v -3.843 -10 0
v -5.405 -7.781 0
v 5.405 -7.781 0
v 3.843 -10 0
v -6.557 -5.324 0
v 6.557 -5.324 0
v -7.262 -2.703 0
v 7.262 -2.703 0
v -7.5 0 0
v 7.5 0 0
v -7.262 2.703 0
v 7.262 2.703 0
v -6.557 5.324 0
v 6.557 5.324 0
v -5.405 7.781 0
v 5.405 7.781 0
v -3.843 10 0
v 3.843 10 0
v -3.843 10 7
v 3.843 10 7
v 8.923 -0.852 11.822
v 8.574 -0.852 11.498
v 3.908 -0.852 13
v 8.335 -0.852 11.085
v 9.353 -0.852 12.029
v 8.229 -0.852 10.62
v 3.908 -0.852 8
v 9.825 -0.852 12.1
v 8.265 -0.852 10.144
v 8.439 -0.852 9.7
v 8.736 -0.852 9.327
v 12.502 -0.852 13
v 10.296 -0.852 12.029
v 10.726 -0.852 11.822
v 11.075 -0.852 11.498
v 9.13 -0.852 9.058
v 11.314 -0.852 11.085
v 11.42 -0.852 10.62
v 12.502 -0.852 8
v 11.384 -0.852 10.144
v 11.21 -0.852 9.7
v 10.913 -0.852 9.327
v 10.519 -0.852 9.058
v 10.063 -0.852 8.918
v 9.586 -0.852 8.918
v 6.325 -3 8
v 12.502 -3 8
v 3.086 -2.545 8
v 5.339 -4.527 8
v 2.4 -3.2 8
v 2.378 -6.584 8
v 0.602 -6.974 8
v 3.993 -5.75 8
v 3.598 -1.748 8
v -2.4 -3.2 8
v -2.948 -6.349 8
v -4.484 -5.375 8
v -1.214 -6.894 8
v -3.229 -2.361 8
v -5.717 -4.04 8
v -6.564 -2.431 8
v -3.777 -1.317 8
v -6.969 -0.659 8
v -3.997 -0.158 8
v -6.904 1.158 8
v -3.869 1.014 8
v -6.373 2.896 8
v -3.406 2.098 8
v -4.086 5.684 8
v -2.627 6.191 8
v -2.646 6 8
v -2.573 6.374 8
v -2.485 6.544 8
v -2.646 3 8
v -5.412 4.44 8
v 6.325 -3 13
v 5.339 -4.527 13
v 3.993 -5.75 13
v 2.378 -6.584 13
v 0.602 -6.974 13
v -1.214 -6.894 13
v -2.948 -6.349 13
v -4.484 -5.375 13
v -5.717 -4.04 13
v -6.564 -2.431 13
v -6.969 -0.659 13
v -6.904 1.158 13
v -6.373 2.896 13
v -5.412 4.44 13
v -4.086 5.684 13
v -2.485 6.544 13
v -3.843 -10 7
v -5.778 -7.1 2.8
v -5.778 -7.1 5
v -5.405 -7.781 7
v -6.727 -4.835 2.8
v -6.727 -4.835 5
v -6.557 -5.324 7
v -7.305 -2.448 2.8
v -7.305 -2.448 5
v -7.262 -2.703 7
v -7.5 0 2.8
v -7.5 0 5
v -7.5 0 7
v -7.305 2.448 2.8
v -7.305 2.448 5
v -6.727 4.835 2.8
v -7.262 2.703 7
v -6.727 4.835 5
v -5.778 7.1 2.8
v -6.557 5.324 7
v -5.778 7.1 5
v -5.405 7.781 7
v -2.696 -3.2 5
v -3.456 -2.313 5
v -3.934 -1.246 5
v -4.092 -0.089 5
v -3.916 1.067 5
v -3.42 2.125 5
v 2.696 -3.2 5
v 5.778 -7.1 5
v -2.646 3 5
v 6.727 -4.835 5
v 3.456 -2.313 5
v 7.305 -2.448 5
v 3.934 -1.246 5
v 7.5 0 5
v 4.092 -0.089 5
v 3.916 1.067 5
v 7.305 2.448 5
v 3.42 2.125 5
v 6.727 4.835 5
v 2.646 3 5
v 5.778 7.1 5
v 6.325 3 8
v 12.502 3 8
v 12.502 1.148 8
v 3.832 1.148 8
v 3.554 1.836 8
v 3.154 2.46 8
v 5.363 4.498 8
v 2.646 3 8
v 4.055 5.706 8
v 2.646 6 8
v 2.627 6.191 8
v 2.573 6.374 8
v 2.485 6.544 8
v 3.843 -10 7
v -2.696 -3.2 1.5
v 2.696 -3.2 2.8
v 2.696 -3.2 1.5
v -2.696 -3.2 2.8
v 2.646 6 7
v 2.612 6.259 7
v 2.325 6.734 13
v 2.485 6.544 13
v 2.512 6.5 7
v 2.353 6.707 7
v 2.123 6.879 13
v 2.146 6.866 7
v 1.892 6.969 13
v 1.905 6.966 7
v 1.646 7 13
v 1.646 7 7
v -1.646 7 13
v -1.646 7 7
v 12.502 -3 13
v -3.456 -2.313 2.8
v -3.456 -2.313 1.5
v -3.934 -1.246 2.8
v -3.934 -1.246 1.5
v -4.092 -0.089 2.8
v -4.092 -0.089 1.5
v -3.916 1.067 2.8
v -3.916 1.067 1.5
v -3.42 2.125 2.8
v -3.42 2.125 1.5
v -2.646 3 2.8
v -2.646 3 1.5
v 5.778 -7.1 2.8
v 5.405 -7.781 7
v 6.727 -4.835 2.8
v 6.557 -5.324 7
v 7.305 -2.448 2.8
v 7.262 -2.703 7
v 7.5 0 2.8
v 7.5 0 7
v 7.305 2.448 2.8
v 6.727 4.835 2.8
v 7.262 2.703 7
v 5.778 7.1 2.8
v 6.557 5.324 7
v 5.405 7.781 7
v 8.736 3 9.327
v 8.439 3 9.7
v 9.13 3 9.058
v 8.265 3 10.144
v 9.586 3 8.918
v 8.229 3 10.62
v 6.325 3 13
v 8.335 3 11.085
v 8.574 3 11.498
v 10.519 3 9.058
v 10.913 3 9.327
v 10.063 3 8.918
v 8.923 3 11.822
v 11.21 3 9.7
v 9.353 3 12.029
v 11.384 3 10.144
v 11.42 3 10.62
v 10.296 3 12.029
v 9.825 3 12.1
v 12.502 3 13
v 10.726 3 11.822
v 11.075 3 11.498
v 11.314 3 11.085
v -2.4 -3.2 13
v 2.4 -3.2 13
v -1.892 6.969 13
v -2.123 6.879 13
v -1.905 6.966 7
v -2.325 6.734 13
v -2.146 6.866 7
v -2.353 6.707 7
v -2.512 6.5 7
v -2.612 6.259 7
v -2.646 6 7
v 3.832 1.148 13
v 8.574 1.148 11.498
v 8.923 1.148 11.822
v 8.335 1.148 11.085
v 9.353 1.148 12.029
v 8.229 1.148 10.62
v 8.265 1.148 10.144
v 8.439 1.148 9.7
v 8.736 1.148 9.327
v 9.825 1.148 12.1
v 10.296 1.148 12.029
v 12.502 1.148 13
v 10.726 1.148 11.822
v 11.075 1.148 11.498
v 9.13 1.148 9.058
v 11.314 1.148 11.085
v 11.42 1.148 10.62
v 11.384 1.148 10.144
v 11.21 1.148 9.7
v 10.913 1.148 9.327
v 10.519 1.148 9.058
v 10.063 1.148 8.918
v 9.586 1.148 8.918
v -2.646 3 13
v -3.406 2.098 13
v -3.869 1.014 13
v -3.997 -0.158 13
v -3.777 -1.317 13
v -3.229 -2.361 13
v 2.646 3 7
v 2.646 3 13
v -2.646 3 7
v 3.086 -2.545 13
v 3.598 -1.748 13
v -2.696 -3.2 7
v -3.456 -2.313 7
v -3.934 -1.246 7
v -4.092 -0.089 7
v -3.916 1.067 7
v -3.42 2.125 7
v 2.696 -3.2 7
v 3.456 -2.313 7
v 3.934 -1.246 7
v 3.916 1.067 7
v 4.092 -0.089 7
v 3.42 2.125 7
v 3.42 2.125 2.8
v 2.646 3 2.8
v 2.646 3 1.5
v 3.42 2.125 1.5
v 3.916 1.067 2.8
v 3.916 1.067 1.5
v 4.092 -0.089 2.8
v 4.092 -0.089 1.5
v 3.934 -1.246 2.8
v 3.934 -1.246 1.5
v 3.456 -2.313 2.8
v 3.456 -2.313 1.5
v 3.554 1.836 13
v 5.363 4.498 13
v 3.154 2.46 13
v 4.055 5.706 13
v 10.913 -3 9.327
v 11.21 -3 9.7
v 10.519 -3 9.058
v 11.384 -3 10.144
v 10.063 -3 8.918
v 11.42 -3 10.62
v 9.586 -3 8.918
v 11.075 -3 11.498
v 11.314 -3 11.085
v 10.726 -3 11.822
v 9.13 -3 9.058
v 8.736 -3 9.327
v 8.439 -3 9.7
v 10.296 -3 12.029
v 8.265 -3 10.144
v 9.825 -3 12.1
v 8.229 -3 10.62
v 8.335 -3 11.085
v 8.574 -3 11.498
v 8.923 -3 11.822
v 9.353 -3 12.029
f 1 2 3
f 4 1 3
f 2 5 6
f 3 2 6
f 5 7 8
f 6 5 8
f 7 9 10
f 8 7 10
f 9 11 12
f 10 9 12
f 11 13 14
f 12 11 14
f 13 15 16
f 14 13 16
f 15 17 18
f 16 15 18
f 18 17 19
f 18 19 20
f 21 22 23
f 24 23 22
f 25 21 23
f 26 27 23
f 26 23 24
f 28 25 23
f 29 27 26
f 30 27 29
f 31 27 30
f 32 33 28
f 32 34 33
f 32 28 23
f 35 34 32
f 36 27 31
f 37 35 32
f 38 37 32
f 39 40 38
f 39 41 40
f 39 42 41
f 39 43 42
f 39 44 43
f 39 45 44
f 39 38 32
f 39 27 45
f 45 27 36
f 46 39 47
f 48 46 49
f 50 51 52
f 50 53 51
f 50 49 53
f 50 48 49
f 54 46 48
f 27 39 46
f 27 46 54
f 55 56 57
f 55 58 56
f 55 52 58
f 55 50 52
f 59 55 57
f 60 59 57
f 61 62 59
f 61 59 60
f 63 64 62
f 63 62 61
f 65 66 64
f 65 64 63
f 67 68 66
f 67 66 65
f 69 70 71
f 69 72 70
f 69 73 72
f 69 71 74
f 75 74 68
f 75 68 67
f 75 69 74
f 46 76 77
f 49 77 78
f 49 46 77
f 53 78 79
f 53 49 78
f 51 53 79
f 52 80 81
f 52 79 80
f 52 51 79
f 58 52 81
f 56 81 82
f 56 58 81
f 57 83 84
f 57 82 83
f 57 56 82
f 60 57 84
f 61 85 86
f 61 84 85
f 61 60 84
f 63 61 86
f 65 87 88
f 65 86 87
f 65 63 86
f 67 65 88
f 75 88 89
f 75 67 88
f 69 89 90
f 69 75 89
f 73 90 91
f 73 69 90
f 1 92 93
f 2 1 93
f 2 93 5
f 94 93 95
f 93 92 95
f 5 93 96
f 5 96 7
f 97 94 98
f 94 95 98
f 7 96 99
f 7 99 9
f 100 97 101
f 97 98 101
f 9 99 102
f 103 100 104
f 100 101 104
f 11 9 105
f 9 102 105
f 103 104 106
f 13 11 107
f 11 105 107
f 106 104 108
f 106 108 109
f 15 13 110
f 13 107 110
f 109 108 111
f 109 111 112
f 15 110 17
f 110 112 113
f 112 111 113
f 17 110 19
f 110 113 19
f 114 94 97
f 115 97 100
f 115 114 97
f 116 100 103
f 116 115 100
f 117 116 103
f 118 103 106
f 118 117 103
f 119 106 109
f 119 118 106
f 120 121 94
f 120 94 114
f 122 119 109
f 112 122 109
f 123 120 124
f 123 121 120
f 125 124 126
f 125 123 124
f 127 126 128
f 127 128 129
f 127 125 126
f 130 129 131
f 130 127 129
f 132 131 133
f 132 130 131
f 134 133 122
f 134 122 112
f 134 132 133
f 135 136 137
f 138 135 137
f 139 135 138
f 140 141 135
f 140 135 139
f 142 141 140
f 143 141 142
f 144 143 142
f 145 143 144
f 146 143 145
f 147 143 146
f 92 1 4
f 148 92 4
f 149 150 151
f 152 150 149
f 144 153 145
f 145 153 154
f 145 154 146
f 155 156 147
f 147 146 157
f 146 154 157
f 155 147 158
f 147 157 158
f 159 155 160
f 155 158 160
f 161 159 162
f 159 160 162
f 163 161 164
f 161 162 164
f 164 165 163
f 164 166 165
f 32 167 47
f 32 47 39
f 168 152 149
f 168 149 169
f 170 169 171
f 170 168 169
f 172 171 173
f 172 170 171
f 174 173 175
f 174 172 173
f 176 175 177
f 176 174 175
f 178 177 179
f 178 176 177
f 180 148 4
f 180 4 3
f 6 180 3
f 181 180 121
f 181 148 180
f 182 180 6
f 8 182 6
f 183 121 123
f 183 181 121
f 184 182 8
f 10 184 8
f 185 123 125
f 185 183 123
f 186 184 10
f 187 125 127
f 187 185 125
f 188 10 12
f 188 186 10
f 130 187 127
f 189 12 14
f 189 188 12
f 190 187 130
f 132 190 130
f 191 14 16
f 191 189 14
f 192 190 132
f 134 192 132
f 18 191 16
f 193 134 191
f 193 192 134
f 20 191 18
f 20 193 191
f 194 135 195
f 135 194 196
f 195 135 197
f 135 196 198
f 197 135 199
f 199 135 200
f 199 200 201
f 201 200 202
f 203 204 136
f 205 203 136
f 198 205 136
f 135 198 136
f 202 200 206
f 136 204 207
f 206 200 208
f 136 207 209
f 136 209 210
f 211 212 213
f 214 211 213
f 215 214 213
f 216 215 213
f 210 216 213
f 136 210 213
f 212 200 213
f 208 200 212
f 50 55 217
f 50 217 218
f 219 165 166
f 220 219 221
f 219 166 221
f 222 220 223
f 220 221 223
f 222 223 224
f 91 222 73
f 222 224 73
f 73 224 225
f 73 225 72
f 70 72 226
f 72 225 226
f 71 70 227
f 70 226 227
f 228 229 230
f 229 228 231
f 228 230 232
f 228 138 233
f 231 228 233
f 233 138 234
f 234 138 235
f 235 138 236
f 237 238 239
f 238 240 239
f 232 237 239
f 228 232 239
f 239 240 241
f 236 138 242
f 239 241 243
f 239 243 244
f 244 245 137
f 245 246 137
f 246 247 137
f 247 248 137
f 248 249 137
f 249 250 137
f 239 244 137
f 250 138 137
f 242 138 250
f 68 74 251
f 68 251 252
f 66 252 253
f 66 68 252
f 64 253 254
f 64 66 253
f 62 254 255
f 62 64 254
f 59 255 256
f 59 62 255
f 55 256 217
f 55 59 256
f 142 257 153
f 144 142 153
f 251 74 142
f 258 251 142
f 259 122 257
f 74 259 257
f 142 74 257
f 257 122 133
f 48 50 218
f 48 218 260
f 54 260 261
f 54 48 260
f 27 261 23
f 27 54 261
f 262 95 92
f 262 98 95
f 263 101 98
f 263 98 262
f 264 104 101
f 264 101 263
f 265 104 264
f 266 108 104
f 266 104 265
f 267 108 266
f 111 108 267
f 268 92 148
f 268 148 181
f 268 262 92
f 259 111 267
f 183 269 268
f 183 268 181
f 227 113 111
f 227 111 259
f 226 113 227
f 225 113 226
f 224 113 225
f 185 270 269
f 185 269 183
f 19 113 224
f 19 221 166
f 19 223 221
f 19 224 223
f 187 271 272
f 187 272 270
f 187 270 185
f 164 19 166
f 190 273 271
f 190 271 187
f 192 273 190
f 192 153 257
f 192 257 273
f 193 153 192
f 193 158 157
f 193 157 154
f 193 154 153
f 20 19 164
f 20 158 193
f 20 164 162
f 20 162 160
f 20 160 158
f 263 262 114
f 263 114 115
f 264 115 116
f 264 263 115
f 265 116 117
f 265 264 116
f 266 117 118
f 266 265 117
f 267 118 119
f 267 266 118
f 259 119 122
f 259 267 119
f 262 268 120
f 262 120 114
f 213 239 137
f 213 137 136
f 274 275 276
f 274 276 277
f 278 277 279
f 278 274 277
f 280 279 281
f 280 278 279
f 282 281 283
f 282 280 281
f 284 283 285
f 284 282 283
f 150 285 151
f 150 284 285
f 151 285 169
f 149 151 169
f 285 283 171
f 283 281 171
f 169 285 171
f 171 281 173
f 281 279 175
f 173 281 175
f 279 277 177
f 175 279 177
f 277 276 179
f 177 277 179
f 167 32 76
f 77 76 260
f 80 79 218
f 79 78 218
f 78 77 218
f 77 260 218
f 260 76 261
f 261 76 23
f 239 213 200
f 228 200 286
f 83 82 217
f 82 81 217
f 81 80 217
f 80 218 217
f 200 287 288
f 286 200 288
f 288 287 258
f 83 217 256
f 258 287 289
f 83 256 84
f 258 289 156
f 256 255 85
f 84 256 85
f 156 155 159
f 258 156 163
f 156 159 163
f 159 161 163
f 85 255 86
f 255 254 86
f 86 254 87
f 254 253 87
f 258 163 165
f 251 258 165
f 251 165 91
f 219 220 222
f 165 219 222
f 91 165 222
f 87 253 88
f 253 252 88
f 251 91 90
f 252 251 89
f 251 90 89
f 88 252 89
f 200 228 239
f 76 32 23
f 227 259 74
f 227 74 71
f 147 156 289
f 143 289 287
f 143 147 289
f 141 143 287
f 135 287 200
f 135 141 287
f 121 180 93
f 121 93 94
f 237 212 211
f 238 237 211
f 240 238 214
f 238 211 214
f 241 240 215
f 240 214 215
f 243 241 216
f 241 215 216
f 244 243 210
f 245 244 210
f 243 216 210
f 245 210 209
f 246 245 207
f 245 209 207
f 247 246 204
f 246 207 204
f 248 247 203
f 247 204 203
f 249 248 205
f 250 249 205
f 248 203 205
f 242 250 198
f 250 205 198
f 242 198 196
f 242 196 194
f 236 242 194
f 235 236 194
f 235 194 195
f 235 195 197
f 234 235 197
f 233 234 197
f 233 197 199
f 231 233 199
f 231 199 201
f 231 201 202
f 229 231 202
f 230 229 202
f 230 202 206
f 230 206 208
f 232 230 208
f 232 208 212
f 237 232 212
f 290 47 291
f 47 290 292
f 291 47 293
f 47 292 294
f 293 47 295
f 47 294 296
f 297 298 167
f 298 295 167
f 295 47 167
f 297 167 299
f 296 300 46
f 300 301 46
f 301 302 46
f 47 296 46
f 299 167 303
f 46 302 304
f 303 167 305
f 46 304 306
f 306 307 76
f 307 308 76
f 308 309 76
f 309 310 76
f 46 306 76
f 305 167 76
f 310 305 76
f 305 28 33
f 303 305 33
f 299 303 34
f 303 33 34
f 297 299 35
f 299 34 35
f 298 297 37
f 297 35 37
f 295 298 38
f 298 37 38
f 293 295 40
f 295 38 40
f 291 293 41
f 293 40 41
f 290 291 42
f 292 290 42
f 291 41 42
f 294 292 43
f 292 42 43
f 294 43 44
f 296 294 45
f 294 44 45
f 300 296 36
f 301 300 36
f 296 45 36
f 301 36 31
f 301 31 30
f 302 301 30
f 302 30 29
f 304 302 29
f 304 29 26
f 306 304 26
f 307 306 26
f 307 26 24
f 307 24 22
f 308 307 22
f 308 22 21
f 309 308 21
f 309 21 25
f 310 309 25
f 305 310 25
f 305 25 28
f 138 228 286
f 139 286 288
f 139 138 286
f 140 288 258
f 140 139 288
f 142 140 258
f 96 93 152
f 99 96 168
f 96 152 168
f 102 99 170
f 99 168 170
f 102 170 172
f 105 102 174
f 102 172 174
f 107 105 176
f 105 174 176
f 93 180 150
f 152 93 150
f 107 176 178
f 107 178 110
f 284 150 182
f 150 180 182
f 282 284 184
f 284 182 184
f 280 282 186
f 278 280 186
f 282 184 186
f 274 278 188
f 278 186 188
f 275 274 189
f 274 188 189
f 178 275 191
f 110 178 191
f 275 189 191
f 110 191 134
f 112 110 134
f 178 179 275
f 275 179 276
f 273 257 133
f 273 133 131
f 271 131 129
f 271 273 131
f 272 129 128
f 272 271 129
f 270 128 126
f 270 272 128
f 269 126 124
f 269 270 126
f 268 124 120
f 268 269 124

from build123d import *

# Parameters (mm, degrees)
SKETCH_1_W               = 16
SKETCH_1_H               = 20
EXTRUDE_1_DEPTH          = 7
CUT_EXTRUDE_1_DEPTH      = 15
CUT_EXTRUDE_3_DEPTH      = 15.594519519
SKETCH_6_W               = 5.291502622
SKETCH_6_H               = 4
EXTRUDE_2_DEPTH          = 1
CUT_EXTRUDE_5_DEPTH      = 17.338184405
CUT_EXTRUDE_5_DEPTH_BACK = 17.338184405
SKETCH_7_W               = 2.2
SKETCH_7_H               = 14.2
SKETCH_8_R               = 4.915012662
EXTRUDE_3_DEPTH          = 1.5
SKETCH_9_R               = 7
SKETCH_9_R_2             = 4
EXTRUDE_4_DEPTH          = 5
SKETCH_10_W              = 5.291502622
SKETCH_10_H              = 4
SKETCH_10_W_2            = 5.341465502
SKETCH_10_H_2            = 1.894443453
EXTRUDE_5_DEPTH          = 5
FILLET_1_R               = 1
EXTRUDE_6_DEPTH          = 5
CUT_EXTRUDE_6_DEPTH      = 21.622580814
CUT_EXTRUDE_6_DEPTH_BACK = 5
SKETCH_12_W              = 10.898323227
SKETCH_12_H              = 2
SKETCH_13_R              = 1.6
CUT_EXTRUDE_7_DEPTH      = 23.232652551


with BuildPart() as part:
    # 草图1 → 凸台-拉伸1 (new body)
    with BuildSketch(Plane.XY):
        Rectangle(SKETCH_1_W, SKETCH_1_H)
    extrude(amount=EXTRUDE_1_DEPTH)

    # 草图2 → 切除-拉伸1 (cut)
    with BuildSketch(Plane.XY.offset(7)):
        with BuildLine():
            Line((-2.645751311, 3), (2.645751311, 3))
            ThreePointArc((2.645751311, 3), (4.091798312, -0.088548302), (2.695714191, -3.2))
            Line((2.695714191, -3.2), (-2.695714191, -3.2))
            ThreePointArc((-2.695714191, -3.2), (-4.091798312, -0.088548302), (-2.645751311, 3))
        make_face()
    extrude(amount=-CUT_EXTRUDE_1_DEPTH, mode=Mode.SUBTRACT)

    # 草图4 → 切除-拉伸3 (cut, through all)
    with BuildSketch(Plane.XY.offset(7)):
        with BuildLine():
            Line((-3.842719282, 10), (-8, 10))
            Line((-8, 10), (-8, -10))
            Line((-8, -10), (-3.842719282, -10))
            ThreePointArc((-3.842719282, -10), (-7.5, 0), (-3.842719282, 10))
        make_face()
        with BuildLine():
            Line((3.842719282, 10), (8, 10))
            Line((8, 10), (8, -10))
            Line((8, -10), (3.842719282, -10))
            ThreePointArc((3.842719282, -10), (7.5, 0), (3.842719282, 10))
        make_face()
    extrude(amount=-CUT_EXTRUDE_3_DEPTH, mode=Mode.SUBTRACT)

    # 草图6 → 凸台-拉伸2 (add)
    with BuildSketch(Plane.XY.offset(7)):
        with Locations((0, 5)):
            Rectangle(SKETCH_6_W, SKETCH_6_H)
    extrude(amount=EXTRUDE_2_DEPTH)

    # 草图7 → 切除-拉伸5 (cut, two sides: drawn at the far end of the back side and taken through both)
    with BuildSketch(Plane.ZY.offset(2.645751311).offset(-CUT_EXTRUDE_5_DEPTH_BACK)):
        with Locations((3.9, 0)):
            Rectangle(SKETCH_7_W, SKETCH_7_H)
    extrude(amount=CUT_EXTRUDE_5_DEPTH + CUT_EXTRUDE_5_DEPTH_BACK, mode=Mode.SUBTRACT)

    # 草图8 → 凸台-拉伸3 (add)
    with BuildSketch(Plane(origin=(0, 0, 0), x_dir=(-1, 0, 0), z_dir=(0, 0, -1))):
        Circle(SKETCH_8_R)
    extrude(amount=-EXTRUDE_3_DEPTH)

    # 草图9 → 凸台-拉伸4 (add)
    with BuildSketch(Plane.XY.offset(8)):
        with Locations(Location((0, 0, 0), (0, 0, 112.207654299))):
            Circle(SKETCH_9_R)
        with Locations(Location((0, 0, 0), (0, 0, 131.409622109))):
            Circle(SKETCH_9_R_2, mode=Mode.SUBTRACT)
    extrude(amount=EXTRUDE_4_DEPTH)

    # 草图10 → 凸台-拉伸5 (add)
    with BuildSketch(Plane.XY.offset(8)):
        with Locations((0, 5)):
            Rectangle(SKETCH_10_W, SKETCH_10_H)
        with Locations((0.02498144, -4.147221726)):
            Rectangle(SKETCH_10_W_2, SKETCH_10_H_2)
    extrude(amount=EXTRUDE_5_DEPTH)

    # 圆角1
    # the kernel refuses this fillet: 1 mm, written as the material it takes off along each edge
    with BuildSketch(Plane(origin=(2.645751311, 7, 7), x_dir=(-1, 0, 0), z_dir=(0, 0, 1))) as fillet_1_piece_1_section:
        with BuildLine():
            CenterArc((FILLET_1_R, FILLET_1_R), FILLET_1_R, 180, 90)
            Line((0, FILLET_1_R), (0, 0))
            Line((0, 0), (FILLET_1_R, 0))
        make_face()
    fillet_1_piece_1 = extrude(amount=8.5, mode=Mode.PRIVATE)
    fillet_1_piece_1 = split(fillet_1_piece_1, bisect_by=Plane(origin=(2.390465062, 6.836939251, 8), z_dir=(0, 0, -1)), keep=Keep.TOP, mode=Mode.PRIVATE)
    fillet_1_piece_1 = fillet_1_piece_1 - Plane(origin=(0, 0, 7.5), x_dir=(-0.3779644730157475, 0.9258200997698897, 0), z_dir=(0, 0, -1)) * Cylinder(7, 21, mode=Mode.PRIVATE)
    add(fillet_1_piece_1, mode=Mode.SUBTRACT)
    with BuildSketch(Plane(origin=(2.645751311, 7, 7), x_dir=(-1, 0, 0), z_dir=(0, 0, 1))) as fillet_1_piece_2_section:
        with BuildLine():
            CenterArc((FILLET_1_R, FILLET_1_R), FILLET_1_R, 180, 90)
            Line((0, FILLET_1_R), (0, 0))
            Line((0, 0), (FILLET_1_R, 0))
        make_face()
    fillet_1_piece_2 = extrude(amount=8.5, mode=Mode.PRIVATE)
    fillet_1_piece_2 = split(fillet_1_piece_2, bisect_by=Plane(origin=(2.615865348, 6.342822841, 8), z_dir=(0, 0, -1)), keep=Keep.TOP, mode=Mode.PRIVATE)
    fillet_1_piece_2 = fillet_1_piece_2 & Plane(origin=(0, 0, 7.5), x_dir=(-0.3779644730157475, 0.9258200997698897, 0), z_dir=(0, 0, -1)) * Cylinder(7, 21, mode=Mode.PRIVATE)
    add(fillet_1_piece_2, mode=Mode.SUBTRACT)
    with BuildSketch(Plane(origin=(2.645751311, 7, 7), x_dir=(-1, 0, 0), z_dir=(0, 0, 1))) as fillet_1_piece_3_section:
        with BuildLine():
            CenterArc((FILLET_1_R, FILLET_1_R), FILLET_1_R, 180, 90)
            Line((0, FILLET_1_R), (0, 0))
            Line((0, 0), (FILLET_1_R, 0))
        make_face()
    fillet_1_piece_3 = extrude(amount=8.5, mode=Mode.PRIVATE)
    fillet_1_piece_3 = split(fillet_1_piece_3, bisect_by=Plane(origin=(2.390465062, 6.836939251, 8), z_dir=(0, 0, 1)), keep=Keep.TOP, mode=Mode.PRIVATE)
    fillet_1_piece_3 = fillet_1_piece_3 - Plane(origin=(0, 0, 11.75), x_dir=(-0.3779644730157475, 0.9258200997698897, 0), z_dir=(0, 0, -1)) * Cylinder(7, 21, mode=Mode.PRIVATE)
    add(fillet_1_piece_3, mode=Mode.SUBTRACT)
    with BuildSketch(Plane(origin=(-2.645751311, 7, 7), x_dir=(0, -1, 0), z_dir=(0, 0, 1))) as fillet_1_piece_4_section:
        with BuildLine():
            CenterArc((FILLET_1_R, FILLET_1_R), FILLET_1_R, 180, 90)
            Line((0, FILLET_1_R), (0, 0))
            Line((0, 0), (FILLET_1_R, 0))
        make_face()
    fillet_1_piece_4 = extrude(amount=8.5, mode=Mode.PRIVATE)
    fillet_1_piece_4 = fillet_1_piece_4 & Plane(origin=(0, 0, 7.5), x_dir=(-0.3779644730157475, 0.9258200997698897, 0), z_dir=(0, 0, -1)) * Cylinder(7, 21, mode=Mode.PRIVATE)
    fillet_1_piece_4 = split(fillet_1_piece_4, bisect_by=Plane(origin=(-2.615865348, 6.342822841, 8), z_dir=(0, 0, -1)), keep=Keep.TOP, mode=Mode.PRIVATE)
    add(fillet_1_piece_4, mode=Mode.SUBTRACT)
    with BuildSketch(Plane(origin=(-2.645751311, 7, 7), x_dir=(0, -1, 0), z_dir=(0, 0, 1))) as fillet_1_piece_5_section:
        with BuildLine():
            CenterArc((FILLET_1_R, FILLET_1_R), FILLET_1_R, 180, 90)
            Line((0, FILLET_1_R), (0, 0))
            Line((0, 0), (FILLET_1_R, 0))
        make_face()
    fillet_1_piece_5 = extrude(amount=8.5, mode=Mode.PRIVATE)
    fillet_1_piece_5 = fillet_1_piece_5 - Plane(origin=(0, 0, 7.5), x_dir=(-0.3779644730157475, 0.9258200997698897, 0), z_dir=(0, 0, -1)) * Cylinder(7, 21, mode=Mode.PRIVATE)
    fillet_1_piece_5 = split(fillet_1_piece_5, bisect_by=Plane(origin=(-2.390465062, 6.836939251, 8), z_dir=(0, 0, -1)), keep=Keep.TOP, mode=Mode.PRIVATE)
    add(fillet_1_piece_5, mode=Mode.SUBTRACT)
    with BuildSketch(Plane(origin=(-2.645751311, 7, 7), x_dir=(0, -1, 0), z_dir=(0, 0, 1))) as fillet_1_piece_6_section:
        with BuildLine():
            CenterArc((FILLET_1_R, FILLET_1_R), FILLET_1_R, 180, 90)
            Line((0, FILLET_1_R), (0, 0))
            Line((0, 0), (FILLET_1_R, 0))
        make_face()
    fillet_1_piece_6 = extrude(amount=8.5, mode=Mode.PRIVATE)
    fillet_1_piece_6 = fillet_1_piece_6 - Plane(origin=(0, 0, 11.75), x_dir=(-0.3779644730157475, 0.9258200997698897, 0), z_dir=(0, 0, -1)) * Cylinder(7, 21, mode=Mode.PRIVATE)
    fillet_1_piece_6 = split(fillet_1_piece_6, bisect_by=Plane(origin=(-2.390465062, 6.836939251, 8), z_dir=(0, 0, 1)), keep=Keep.TOP, mode=Mode.PRIVATE)
    add(fillet_1_piece_6, mode=Mode.SUBTRACT)

    # 草图11 → 凸台-拉伸6 (add)
    with BuildSketch(Plane.XY.offset(13)):
        Polygon((12.501633471, 1), (12.501633471, -1), (12.501633471, -3), (5.400773292, -3), (5.400773292, -1), (5.400773292, 1), (5.400773292, 3), (12.501633471, 3), align=None)
    extrude(amount=-EXTRUDE_6_DEPTH)

    # 草图12 → 切除-拉伸6 (cut, two sides: drawn at the far end of the back side and taken through both)
    with BuildSketch(Plane.XY.offset(13).offset(-CUT_EXTRUDE_6_DEPTH_BACK)):
        with Locations((7.052471858, 0.148280364)):
            Rectangle(SKETCH_12_W, SKETCH_12_H)
    extrude(amount=CUT_EXTRUDE_6_DEPTH + CUT_EXTRUDE_6_DEPTH_BACK, mode=Mode.SUBTRACT)

    # 草图13 → 切除-拉伸7 (cut, through all)
    with BuildSketch(Plane(origin=(0, 3, 0), x_dir=(1, 0, 0), z_dir=(0, 1, 0))):
        with Locations(Location((9.82455532, -10.5, 0), (0, 0, 270))):
            Circle(SKETCH_13_R)
    extrude(amount=-CUT_EXTRUDE_7_DEPTH, mode=Mode.SUBTRACT)


solid = part.part
